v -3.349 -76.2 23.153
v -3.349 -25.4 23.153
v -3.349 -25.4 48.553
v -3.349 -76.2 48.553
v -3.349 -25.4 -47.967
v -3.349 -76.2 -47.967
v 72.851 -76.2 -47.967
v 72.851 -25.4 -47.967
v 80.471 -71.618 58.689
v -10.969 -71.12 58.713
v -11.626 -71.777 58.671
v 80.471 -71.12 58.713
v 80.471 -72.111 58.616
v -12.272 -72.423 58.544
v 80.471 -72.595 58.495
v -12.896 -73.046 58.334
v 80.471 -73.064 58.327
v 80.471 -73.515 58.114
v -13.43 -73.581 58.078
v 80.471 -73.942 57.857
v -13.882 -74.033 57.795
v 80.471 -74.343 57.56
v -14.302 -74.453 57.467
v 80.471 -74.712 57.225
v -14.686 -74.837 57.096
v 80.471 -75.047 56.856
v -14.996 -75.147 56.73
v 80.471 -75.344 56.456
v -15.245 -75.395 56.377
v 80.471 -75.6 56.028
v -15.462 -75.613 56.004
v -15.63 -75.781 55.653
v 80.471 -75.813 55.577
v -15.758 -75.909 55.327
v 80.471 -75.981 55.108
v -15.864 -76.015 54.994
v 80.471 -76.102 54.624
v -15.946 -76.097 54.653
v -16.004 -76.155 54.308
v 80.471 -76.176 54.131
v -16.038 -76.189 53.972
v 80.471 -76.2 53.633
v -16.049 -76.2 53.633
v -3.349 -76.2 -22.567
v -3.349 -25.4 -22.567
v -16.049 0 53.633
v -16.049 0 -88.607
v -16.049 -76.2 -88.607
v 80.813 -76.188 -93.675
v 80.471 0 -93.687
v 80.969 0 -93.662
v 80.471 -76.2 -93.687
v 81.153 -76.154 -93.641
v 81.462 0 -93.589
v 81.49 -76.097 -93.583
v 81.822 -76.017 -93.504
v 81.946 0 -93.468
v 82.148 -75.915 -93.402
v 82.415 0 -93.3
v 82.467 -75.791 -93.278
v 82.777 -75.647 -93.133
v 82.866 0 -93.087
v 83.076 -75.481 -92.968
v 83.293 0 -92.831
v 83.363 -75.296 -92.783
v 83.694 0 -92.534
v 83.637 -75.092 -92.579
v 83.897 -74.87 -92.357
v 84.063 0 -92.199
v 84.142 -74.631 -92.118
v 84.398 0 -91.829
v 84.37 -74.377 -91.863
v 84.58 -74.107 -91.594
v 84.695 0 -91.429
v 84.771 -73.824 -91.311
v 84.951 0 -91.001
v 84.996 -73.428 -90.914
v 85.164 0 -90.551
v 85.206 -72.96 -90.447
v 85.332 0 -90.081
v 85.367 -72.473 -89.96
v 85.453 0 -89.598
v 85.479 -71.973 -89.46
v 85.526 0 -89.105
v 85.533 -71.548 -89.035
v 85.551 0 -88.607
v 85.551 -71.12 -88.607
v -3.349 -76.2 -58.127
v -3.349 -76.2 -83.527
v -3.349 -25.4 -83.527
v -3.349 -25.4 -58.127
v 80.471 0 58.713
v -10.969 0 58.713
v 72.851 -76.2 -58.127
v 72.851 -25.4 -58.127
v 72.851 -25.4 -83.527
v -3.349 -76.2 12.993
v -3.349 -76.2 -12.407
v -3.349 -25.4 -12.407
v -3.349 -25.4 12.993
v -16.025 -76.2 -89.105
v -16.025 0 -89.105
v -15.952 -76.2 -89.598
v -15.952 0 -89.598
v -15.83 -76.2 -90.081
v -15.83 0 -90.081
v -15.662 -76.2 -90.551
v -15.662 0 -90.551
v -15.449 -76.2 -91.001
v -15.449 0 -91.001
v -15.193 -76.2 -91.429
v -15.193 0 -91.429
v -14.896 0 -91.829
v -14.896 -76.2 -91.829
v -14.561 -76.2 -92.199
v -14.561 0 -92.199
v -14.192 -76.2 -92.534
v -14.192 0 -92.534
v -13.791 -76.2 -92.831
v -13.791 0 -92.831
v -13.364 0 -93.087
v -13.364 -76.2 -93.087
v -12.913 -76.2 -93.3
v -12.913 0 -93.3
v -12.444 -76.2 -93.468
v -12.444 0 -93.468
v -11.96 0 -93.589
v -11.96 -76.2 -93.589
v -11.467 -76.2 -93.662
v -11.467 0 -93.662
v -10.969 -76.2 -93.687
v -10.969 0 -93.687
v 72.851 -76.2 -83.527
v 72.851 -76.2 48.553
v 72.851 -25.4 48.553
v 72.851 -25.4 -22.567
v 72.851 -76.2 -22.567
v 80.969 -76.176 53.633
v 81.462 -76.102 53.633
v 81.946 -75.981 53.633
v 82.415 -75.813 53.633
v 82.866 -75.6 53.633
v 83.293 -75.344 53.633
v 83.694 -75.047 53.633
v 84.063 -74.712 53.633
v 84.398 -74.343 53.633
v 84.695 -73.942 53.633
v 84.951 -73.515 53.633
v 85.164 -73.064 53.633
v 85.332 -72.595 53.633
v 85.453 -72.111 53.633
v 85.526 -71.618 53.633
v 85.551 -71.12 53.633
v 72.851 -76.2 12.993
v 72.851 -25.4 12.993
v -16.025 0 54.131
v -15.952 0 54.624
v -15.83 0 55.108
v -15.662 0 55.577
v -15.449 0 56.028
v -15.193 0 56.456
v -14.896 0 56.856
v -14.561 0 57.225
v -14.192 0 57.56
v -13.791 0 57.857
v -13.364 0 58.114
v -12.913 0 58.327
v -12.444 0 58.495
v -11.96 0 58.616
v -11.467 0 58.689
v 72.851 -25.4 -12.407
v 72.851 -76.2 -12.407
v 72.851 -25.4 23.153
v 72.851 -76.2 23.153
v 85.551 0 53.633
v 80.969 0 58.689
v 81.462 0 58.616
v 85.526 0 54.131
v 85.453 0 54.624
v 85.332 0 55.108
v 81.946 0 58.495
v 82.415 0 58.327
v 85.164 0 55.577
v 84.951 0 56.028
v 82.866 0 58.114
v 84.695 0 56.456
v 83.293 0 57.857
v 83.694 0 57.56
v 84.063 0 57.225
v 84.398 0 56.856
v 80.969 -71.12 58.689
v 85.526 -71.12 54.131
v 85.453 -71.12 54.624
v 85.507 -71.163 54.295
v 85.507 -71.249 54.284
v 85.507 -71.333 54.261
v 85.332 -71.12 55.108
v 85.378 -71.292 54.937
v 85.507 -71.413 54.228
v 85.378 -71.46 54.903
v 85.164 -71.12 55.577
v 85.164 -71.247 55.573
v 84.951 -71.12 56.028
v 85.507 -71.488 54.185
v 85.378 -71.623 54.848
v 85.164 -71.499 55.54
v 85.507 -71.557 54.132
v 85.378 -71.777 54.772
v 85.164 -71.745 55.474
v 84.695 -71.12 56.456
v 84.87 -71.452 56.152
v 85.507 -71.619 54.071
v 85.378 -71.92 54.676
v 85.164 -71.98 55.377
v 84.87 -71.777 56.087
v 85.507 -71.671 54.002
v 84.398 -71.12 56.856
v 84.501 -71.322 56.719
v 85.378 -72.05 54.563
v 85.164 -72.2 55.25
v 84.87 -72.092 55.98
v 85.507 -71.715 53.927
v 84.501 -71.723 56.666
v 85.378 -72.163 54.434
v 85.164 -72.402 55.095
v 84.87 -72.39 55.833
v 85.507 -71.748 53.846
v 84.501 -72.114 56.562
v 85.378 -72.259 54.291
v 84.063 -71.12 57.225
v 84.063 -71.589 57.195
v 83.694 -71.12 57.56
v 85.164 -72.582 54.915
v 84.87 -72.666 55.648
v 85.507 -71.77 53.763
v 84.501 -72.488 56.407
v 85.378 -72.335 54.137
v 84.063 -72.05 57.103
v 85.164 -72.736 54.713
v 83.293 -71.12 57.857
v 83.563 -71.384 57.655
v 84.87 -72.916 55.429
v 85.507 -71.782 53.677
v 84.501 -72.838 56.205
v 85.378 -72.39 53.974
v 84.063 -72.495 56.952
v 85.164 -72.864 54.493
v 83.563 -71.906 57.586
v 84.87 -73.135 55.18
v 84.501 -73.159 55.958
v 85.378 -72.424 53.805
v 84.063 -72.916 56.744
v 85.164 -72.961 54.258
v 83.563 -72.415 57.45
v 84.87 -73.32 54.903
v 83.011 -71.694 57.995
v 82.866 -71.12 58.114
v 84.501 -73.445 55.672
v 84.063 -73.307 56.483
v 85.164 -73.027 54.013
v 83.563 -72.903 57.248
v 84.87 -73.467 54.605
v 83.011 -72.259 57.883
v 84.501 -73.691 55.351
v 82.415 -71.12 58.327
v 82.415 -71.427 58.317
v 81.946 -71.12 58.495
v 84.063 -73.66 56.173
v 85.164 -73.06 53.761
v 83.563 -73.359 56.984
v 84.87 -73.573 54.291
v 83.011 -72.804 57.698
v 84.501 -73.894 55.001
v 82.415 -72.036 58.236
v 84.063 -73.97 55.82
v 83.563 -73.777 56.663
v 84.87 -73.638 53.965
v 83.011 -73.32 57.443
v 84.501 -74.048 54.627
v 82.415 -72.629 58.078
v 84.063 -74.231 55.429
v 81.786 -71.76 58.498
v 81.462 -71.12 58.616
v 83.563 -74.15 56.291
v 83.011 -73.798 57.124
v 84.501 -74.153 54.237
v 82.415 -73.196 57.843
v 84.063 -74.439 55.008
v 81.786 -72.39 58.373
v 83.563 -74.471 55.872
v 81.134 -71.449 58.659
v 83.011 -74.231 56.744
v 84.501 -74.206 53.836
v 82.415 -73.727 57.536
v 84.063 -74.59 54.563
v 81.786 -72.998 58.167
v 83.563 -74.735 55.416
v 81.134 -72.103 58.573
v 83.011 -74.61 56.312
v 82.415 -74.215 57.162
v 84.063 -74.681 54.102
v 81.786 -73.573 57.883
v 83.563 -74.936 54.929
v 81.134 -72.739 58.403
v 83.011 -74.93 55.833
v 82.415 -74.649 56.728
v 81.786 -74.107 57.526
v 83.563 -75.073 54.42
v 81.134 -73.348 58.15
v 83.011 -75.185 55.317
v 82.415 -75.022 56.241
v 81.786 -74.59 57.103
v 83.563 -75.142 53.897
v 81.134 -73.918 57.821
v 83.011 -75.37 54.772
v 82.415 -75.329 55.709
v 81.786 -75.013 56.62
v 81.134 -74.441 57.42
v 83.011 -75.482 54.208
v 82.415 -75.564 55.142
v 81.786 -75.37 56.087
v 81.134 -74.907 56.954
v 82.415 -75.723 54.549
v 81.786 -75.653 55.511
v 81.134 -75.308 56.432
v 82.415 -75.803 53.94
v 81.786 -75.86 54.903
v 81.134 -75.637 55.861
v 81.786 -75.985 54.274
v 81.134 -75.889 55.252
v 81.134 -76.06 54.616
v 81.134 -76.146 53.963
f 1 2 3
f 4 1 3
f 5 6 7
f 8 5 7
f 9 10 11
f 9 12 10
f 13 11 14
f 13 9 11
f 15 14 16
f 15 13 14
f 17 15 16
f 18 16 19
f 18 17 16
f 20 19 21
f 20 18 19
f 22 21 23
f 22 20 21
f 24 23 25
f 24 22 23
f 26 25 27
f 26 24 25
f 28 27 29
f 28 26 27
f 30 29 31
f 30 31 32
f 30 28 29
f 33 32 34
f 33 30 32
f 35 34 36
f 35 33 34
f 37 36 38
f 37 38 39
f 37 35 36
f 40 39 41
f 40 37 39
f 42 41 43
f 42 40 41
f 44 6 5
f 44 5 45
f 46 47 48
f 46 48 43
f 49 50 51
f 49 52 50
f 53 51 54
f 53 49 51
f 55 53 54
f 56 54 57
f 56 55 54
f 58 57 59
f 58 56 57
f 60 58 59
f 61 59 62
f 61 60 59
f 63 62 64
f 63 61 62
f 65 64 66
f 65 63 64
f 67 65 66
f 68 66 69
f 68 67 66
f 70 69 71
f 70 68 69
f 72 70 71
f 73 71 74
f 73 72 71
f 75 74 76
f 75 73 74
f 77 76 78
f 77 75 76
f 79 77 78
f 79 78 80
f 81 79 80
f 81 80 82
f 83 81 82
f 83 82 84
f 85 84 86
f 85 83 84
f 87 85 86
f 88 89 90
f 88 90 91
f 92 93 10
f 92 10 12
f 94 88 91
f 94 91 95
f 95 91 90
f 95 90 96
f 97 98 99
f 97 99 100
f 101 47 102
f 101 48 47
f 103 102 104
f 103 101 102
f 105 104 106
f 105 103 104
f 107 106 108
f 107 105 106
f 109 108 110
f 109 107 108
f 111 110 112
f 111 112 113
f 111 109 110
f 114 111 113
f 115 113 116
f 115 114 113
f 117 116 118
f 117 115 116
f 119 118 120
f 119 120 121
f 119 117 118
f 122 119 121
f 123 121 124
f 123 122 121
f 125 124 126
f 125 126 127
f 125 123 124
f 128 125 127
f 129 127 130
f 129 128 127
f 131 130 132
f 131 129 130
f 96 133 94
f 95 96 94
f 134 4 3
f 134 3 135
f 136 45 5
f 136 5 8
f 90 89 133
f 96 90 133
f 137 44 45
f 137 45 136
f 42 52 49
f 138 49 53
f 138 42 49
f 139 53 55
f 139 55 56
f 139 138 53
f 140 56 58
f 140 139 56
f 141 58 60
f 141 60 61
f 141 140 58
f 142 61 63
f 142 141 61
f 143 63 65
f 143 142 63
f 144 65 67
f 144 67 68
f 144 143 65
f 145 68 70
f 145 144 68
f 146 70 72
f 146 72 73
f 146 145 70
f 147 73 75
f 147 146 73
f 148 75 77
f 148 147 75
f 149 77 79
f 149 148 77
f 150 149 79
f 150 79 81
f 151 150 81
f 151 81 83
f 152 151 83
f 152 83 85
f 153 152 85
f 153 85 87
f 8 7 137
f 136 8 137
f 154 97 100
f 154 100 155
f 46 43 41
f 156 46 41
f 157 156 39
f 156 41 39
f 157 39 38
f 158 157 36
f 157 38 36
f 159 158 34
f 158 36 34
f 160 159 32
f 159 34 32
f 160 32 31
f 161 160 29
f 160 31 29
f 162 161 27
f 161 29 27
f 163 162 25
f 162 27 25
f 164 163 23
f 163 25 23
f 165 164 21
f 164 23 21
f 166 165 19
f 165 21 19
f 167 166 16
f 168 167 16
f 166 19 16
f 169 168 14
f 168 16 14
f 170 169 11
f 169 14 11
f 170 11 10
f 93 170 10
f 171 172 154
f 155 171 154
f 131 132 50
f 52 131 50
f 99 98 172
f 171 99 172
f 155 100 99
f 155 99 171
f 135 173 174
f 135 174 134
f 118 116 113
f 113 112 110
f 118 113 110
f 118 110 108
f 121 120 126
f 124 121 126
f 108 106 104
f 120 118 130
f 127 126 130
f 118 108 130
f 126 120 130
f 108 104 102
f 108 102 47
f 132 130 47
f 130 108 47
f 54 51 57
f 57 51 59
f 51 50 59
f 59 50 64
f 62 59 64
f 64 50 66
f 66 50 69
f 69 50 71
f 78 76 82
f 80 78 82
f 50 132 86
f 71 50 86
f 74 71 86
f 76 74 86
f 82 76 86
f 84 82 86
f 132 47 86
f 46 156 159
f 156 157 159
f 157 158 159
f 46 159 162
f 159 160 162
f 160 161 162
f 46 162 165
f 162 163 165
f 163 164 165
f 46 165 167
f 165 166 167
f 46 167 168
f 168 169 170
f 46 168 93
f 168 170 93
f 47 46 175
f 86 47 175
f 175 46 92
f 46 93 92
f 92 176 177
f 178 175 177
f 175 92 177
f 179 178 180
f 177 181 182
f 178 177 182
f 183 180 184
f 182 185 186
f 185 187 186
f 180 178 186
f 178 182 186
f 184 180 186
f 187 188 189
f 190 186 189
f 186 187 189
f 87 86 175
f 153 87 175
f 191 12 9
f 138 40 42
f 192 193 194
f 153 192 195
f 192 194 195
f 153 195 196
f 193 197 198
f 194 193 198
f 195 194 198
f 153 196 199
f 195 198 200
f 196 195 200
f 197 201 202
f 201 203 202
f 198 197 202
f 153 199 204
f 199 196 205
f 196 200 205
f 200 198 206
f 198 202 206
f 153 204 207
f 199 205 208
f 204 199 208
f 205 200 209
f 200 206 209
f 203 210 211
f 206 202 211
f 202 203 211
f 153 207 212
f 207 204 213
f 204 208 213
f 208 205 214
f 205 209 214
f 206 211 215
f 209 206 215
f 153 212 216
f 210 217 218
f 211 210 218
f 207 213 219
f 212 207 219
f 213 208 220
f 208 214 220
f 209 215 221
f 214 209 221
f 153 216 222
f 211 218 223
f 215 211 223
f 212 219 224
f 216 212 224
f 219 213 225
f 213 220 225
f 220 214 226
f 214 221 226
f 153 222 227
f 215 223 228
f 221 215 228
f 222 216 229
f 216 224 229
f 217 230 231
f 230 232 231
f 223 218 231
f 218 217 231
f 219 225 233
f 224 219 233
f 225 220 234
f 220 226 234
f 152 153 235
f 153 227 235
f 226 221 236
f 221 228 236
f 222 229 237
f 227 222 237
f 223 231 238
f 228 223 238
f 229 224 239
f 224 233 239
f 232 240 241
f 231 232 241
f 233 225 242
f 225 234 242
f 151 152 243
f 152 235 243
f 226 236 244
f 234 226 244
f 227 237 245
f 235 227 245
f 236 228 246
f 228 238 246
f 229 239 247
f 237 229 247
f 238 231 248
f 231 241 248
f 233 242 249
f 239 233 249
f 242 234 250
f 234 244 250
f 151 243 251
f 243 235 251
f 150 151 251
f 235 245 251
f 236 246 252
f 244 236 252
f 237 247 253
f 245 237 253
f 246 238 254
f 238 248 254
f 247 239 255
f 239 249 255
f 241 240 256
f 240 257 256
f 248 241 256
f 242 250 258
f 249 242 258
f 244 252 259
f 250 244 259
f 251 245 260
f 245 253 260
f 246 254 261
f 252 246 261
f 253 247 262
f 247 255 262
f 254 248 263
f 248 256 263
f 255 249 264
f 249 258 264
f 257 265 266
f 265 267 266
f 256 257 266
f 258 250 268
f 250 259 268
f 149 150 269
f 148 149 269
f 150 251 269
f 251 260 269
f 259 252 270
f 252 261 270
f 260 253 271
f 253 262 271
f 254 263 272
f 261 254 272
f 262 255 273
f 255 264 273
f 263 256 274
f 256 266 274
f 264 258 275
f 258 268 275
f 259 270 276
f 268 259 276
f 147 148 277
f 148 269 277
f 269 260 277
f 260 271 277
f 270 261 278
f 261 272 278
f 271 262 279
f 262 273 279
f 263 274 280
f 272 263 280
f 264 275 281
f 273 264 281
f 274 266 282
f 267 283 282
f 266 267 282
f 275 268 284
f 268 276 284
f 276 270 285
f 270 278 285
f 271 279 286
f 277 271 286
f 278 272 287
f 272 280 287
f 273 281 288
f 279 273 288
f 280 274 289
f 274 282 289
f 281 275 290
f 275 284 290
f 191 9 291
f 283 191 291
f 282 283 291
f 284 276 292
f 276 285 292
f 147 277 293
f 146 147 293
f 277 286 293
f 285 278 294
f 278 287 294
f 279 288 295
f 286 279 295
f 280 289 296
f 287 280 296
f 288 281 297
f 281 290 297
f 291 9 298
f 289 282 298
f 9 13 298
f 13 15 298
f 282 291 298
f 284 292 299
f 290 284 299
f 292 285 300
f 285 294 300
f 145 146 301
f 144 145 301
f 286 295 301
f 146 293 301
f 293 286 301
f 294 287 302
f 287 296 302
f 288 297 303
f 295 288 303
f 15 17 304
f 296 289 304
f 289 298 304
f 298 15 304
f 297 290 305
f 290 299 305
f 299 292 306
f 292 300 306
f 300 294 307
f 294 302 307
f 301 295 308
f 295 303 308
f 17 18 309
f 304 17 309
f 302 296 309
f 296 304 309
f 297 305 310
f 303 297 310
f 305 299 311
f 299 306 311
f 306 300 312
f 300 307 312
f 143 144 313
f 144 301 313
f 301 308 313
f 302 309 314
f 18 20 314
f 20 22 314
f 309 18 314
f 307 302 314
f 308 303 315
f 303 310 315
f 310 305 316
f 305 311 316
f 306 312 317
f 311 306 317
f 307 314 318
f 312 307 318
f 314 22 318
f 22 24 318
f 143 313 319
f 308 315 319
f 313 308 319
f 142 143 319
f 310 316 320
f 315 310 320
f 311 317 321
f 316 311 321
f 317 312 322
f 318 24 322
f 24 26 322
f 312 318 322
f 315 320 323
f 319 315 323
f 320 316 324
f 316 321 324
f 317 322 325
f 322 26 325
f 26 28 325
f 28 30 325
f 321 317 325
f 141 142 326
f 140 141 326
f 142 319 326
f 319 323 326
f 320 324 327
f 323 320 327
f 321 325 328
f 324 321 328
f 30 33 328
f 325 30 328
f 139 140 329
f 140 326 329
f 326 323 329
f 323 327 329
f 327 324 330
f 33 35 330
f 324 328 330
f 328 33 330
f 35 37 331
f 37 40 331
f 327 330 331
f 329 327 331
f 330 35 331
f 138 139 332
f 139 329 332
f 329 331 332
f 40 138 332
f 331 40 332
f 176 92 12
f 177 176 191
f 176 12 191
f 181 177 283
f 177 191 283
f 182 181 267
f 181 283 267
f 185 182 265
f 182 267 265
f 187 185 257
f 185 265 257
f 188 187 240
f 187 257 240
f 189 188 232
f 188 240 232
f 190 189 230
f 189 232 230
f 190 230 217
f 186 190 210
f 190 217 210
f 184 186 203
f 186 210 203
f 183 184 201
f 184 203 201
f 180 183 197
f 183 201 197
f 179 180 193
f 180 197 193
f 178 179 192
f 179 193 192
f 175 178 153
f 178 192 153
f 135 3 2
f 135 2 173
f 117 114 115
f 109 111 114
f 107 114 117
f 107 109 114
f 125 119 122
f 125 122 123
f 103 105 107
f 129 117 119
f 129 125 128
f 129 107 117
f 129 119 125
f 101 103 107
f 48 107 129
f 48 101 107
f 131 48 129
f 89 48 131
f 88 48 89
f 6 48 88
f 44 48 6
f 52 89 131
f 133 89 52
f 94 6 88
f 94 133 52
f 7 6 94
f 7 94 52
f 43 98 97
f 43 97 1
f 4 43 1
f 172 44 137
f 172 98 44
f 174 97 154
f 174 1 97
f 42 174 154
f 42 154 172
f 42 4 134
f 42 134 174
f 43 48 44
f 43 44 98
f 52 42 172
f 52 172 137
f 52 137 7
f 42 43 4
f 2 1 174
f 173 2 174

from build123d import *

# Parameters (mm, degrees)
F0_W     = 101.6
F0_H     = 152.4
F1_DEPTH = 76.2
F2_W     = 76.2
F2_H     = 25.4
F3_DEPTH = 50.8
F4_R     = 5.08


with BuildPart() as f1:
    # F0 (on Front) → F1 (new body)
    with BuildSketch(Plane.XZ):
        with Locations((34.750886, -17.486643)):
            Rectangle(F0_W, F0_H)
    extrude(amount=F1_DEPTH)

    # F2 (on face) → F3 (cut)
    with BuildSketch(Plane.XZ.offset(76.2)):
        with Locations((34.750886, 35.853357)):
            Rectangle(F2_W, F2_H)
        with Locations((34.750886, 0.293357)):
            Rectangle(F2_W, F2_H)
        with Locations((34.750886, -35.266643)):
            Rectangle(F2_W, F2_H)
        with Locations((34.750886, -70.826643)):
            Rectangle(F2_W, F2_H)
    extrude(amount=-F3_DEPTH, mode=Mode.SUBTRACT)

    # F4
    f4_edges = [f1.edges().sort_by_distance(p)[0] for p in [
        (34.750886, -76.2, 58.713357),
        (85.550886, -38.1, 58.713357),
        (85.550886, -38.1, -93.686643),
        (-16.049114, -38.1, -93.686643),
        (-16.049114, -38.1, 58.713357),
        (85.550886, -76.2, -17.486643),
    ]]
    fillet(f4_edges, radius=F4_R)


solid = f1.part
